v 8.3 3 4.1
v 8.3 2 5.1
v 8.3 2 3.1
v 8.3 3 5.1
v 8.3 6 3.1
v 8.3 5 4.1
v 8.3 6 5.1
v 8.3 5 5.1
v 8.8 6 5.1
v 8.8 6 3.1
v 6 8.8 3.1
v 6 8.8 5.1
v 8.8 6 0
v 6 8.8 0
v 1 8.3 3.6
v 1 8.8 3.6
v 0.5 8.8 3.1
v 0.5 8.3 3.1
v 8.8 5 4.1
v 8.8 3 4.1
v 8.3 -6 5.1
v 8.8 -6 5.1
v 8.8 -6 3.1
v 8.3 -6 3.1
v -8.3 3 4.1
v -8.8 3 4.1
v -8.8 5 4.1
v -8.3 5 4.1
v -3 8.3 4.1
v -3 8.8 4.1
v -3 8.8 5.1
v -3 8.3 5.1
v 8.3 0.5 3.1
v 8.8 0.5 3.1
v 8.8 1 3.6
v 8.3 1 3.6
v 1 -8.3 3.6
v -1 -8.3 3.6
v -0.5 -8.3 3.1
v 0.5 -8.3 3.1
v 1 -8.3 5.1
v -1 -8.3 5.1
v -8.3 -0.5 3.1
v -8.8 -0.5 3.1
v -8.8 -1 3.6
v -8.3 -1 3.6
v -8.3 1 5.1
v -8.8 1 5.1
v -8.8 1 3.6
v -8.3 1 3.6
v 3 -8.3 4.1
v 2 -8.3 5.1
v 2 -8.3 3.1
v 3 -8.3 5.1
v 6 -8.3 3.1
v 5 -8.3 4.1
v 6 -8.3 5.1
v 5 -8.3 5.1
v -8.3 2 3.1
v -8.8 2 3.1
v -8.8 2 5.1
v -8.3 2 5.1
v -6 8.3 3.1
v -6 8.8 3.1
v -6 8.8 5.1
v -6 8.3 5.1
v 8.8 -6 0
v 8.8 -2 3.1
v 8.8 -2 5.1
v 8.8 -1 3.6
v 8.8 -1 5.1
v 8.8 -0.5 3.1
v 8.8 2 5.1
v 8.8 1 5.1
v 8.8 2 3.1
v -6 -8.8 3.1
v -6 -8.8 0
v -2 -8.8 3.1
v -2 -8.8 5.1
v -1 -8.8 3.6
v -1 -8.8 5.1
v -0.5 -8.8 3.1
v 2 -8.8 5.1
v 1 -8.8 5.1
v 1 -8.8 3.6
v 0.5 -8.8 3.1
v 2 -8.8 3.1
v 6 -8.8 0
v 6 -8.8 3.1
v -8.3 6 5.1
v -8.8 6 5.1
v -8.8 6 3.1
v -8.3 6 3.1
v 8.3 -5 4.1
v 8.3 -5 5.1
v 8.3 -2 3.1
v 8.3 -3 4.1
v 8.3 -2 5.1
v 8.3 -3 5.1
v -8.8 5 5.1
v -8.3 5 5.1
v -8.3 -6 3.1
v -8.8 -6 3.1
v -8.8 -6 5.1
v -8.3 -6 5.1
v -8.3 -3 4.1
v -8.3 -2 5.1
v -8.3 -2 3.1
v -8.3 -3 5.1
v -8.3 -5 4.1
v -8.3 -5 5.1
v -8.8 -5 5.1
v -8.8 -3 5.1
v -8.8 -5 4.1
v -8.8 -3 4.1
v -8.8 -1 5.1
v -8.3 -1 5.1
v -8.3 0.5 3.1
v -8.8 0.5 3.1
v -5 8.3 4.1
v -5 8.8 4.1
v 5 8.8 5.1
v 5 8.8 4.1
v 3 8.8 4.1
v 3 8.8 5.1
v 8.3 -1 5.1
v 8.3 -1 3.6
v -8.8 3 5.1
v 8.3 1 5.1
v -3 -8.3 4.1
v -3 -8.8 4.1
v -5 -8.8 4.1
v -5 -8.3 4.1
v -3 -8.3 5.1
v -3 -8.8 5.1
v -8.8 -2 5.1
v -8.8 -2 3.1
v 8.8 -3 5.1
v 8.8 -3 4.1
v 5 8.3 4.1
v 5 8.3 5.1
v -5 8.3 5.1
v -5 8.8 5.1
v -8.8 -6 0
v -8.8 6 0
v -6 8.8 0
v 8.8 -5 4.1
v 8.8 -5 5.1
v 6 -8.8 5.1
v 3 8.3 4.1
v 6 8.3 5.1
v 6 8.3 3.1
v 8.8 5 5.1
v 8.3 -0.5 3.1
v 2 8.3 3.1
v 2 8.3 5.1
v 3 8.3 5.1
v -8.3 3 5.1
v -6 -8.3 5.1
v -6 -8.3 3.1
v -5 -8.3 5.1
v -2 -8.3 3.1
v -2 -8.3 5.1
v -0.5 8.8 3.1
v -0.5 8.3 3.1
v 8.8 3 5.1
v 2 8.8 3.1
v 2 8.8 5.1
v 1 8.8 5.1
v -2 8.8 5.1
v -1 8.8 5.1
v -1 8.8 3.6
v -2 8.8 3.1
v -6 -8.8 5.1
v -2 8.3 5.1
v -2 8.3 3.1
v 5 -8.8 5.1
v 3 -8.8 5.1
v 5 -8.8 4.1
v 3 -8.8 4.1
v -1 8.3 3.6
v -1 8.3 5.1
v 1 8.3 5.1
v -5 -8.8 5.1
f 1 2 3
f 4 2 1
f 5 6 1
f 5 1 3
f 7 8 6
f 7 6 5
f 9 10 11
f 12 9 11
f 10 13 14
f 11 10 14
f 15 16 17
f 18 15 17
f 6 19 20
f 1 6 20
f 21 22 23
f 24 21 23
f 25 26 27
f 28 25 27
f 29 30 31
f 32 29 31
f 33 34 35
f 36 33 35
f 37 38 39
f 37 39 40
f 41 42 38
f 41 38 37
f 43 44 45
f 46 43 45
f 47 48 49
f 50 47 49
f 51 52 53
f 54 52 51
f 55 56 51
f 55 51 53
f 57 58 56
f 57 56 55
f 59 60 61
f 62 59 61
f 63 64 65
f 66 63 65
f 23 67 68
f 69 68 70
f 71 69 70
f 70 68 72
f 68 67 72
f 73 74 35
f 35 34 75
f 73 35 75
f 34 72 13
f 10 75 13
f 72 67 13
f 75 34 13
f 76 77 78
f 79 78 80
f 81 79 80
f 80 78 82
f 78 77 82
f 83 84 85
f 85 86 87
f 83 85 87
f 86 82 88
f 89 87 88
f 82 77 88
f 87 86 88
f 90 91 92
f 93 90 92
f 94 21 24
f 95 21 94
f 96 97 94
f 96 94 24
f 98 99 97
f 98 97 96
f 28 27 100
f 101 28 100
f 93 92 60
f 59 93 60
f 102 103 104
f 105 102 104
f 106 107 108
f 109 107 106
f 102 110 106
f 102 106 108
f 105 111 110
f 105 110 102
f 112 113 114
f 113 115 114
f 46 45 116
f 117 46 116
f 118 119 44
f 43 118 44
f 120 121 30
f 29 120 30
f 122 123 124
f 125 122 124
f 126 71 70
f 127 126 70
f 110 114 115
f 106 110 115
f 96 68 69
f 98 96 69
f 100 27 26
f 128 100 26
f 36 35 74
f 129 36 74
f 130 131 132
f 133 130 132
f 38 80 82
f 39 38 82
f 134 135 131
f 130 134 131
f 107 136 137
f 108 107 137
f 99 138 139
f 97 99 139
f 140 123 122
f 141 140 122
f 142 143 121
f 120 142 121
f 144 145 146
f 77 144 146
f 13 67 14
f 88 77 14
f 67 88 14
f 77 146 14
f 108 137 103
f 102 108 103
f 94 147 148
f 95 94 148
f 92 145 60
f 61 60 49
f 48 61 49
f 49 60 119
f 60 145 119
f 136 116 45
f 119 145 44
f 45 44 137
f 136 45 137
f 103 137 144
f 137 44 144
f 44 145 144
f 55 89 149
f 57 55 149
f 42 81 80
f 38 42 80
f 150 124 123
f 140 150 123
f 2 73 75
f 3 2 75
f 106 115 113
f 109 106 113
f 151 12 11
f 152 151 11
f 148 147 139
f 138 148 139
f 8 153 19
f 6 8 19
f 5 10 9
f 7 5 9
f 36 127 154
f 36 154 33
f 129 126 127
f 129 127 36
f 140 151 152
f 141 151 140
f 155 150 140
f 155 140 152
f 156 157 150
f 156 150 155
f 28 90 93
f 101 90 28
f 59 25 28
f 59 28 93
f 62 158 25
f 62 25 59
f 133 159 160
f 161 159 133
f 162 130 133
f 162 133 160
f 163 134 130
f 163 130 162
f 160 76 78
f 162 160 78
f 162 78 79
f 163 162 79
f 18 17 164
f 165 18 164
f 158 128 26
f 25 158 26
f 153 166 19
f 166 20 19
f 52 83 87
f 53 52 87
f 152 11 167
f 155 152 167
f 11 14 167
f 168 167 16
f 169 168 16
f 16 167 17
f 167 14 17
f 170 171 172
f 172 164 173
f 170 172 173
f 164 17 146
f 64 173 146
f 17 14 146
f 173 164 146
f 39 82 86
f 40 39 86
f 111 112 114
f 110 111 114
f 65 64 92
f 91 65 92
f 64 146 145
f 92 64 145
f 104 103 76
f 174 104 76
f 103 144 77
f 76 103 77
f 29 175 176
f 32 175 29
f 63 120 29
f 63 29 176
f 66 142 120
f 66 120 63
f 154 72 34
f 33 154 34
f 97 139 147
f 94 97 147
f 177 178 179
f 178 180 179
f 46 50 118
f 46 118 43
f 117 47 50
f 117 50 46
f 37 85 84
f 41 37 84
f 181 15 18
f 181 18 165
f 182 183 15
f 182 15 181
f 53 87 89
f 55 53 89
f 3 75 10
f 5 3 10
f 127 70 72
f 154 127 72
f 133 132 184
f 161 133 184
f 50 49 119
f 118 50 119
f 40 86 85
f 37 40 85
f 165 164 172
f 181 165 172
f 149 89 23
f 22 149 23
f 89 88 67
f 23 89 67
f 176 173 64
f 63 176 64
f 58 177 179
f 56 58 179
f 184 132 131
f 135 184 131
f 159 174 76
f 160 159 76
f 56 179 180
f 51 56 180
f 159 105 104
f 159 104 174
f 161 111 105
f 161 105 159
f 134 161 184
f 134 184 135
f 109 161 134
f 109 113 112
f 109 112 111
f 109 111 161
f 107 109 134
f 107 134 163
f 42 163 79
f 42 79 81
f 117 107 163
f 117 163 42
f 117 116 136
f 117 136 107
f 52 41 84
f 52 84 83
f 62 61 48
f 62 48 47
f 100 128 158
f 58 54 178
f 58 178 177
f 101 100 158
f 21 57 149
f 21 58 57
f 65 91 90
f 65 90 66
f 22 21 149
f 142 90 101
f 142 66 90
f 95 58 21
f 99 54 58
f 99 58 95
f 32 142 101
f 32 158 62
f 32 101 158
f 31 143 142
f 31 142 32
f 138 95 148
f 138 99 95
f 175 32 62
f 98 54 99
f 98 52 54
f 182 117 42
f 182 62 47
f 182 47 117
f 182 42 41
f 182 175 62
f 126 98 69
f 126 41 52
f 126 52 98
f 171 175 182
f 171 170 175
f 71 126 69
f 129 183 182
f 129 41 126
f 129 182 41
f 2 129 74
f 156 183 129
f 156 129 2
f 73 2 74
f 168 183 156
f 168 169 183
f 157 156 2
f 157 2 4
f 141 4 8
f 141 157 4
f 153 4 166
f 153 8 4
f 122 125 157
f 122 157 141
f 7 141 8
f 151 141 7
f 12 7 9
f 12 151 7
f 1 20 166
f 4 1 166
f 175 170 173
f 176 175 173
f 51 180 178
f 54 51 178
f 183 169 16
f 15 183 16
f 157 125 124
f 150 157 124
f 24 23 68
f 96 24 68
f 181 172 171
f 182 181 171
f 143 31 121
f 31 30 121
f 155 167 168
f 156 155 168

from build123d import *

# Parameters (mm, degrees)
PAD_DEPTH          = 5.1
POCKET_DEPTH       = 0.5
POLARPATTERN_COUNT = 4


with BuildPart() as part:
    # Sketch → Pad (new body)
    with BuildSketch(Plane.XY):
        Polygon((8.8, -6), (8.8, 6), (6, 8.8), (-6, 8.8), (-8.8, 6), (-8.8, -6), (-6, -8.8), (6, -8.8), align=None)
    extrude(amount=PAD_DEPTH)

    # Sketch002 (on Face7 of Pad) → Pocket (cut)
    with BuildSketch(Plane.XZ.offset(8.8)):
        Polygon((-3, 5.1), (-3, 4.1), (-5, 4.1), (-5, 5.1), (-6, 5.1), (-6, 3.1), (-2, 3.1), (-2, 5.1), align=None)
        Polygon((-1, 5.1), (-1, 3.6), (-0.5, 3.1), (0.5, 3.1), (1, 3.6), (1, 5.1), align=None)
        Polygon((2, 5.1), (2, 3.1), (6, 3.1), (6, 5.1), (5, 5.1), (5, 4.1), (3, 4.1), (3, 5.1), align=None)
    pocket = extrude(amount=-POCKET_DEPTH, mode=Mode.SUBTRACT)

    # PolarPattern: Pocket ×4 about axis
    polarpattern_axis = Axis((0, 0, 0), (0, 0, 1))
    for i in range(1, POLARPATTERN_COUNT):
        add(pocket.rotate(polarpattern_axis, i * 360 / POLARPATTERN_COUNT), mode=Mode.SUBTRACT)


solid = part.part
